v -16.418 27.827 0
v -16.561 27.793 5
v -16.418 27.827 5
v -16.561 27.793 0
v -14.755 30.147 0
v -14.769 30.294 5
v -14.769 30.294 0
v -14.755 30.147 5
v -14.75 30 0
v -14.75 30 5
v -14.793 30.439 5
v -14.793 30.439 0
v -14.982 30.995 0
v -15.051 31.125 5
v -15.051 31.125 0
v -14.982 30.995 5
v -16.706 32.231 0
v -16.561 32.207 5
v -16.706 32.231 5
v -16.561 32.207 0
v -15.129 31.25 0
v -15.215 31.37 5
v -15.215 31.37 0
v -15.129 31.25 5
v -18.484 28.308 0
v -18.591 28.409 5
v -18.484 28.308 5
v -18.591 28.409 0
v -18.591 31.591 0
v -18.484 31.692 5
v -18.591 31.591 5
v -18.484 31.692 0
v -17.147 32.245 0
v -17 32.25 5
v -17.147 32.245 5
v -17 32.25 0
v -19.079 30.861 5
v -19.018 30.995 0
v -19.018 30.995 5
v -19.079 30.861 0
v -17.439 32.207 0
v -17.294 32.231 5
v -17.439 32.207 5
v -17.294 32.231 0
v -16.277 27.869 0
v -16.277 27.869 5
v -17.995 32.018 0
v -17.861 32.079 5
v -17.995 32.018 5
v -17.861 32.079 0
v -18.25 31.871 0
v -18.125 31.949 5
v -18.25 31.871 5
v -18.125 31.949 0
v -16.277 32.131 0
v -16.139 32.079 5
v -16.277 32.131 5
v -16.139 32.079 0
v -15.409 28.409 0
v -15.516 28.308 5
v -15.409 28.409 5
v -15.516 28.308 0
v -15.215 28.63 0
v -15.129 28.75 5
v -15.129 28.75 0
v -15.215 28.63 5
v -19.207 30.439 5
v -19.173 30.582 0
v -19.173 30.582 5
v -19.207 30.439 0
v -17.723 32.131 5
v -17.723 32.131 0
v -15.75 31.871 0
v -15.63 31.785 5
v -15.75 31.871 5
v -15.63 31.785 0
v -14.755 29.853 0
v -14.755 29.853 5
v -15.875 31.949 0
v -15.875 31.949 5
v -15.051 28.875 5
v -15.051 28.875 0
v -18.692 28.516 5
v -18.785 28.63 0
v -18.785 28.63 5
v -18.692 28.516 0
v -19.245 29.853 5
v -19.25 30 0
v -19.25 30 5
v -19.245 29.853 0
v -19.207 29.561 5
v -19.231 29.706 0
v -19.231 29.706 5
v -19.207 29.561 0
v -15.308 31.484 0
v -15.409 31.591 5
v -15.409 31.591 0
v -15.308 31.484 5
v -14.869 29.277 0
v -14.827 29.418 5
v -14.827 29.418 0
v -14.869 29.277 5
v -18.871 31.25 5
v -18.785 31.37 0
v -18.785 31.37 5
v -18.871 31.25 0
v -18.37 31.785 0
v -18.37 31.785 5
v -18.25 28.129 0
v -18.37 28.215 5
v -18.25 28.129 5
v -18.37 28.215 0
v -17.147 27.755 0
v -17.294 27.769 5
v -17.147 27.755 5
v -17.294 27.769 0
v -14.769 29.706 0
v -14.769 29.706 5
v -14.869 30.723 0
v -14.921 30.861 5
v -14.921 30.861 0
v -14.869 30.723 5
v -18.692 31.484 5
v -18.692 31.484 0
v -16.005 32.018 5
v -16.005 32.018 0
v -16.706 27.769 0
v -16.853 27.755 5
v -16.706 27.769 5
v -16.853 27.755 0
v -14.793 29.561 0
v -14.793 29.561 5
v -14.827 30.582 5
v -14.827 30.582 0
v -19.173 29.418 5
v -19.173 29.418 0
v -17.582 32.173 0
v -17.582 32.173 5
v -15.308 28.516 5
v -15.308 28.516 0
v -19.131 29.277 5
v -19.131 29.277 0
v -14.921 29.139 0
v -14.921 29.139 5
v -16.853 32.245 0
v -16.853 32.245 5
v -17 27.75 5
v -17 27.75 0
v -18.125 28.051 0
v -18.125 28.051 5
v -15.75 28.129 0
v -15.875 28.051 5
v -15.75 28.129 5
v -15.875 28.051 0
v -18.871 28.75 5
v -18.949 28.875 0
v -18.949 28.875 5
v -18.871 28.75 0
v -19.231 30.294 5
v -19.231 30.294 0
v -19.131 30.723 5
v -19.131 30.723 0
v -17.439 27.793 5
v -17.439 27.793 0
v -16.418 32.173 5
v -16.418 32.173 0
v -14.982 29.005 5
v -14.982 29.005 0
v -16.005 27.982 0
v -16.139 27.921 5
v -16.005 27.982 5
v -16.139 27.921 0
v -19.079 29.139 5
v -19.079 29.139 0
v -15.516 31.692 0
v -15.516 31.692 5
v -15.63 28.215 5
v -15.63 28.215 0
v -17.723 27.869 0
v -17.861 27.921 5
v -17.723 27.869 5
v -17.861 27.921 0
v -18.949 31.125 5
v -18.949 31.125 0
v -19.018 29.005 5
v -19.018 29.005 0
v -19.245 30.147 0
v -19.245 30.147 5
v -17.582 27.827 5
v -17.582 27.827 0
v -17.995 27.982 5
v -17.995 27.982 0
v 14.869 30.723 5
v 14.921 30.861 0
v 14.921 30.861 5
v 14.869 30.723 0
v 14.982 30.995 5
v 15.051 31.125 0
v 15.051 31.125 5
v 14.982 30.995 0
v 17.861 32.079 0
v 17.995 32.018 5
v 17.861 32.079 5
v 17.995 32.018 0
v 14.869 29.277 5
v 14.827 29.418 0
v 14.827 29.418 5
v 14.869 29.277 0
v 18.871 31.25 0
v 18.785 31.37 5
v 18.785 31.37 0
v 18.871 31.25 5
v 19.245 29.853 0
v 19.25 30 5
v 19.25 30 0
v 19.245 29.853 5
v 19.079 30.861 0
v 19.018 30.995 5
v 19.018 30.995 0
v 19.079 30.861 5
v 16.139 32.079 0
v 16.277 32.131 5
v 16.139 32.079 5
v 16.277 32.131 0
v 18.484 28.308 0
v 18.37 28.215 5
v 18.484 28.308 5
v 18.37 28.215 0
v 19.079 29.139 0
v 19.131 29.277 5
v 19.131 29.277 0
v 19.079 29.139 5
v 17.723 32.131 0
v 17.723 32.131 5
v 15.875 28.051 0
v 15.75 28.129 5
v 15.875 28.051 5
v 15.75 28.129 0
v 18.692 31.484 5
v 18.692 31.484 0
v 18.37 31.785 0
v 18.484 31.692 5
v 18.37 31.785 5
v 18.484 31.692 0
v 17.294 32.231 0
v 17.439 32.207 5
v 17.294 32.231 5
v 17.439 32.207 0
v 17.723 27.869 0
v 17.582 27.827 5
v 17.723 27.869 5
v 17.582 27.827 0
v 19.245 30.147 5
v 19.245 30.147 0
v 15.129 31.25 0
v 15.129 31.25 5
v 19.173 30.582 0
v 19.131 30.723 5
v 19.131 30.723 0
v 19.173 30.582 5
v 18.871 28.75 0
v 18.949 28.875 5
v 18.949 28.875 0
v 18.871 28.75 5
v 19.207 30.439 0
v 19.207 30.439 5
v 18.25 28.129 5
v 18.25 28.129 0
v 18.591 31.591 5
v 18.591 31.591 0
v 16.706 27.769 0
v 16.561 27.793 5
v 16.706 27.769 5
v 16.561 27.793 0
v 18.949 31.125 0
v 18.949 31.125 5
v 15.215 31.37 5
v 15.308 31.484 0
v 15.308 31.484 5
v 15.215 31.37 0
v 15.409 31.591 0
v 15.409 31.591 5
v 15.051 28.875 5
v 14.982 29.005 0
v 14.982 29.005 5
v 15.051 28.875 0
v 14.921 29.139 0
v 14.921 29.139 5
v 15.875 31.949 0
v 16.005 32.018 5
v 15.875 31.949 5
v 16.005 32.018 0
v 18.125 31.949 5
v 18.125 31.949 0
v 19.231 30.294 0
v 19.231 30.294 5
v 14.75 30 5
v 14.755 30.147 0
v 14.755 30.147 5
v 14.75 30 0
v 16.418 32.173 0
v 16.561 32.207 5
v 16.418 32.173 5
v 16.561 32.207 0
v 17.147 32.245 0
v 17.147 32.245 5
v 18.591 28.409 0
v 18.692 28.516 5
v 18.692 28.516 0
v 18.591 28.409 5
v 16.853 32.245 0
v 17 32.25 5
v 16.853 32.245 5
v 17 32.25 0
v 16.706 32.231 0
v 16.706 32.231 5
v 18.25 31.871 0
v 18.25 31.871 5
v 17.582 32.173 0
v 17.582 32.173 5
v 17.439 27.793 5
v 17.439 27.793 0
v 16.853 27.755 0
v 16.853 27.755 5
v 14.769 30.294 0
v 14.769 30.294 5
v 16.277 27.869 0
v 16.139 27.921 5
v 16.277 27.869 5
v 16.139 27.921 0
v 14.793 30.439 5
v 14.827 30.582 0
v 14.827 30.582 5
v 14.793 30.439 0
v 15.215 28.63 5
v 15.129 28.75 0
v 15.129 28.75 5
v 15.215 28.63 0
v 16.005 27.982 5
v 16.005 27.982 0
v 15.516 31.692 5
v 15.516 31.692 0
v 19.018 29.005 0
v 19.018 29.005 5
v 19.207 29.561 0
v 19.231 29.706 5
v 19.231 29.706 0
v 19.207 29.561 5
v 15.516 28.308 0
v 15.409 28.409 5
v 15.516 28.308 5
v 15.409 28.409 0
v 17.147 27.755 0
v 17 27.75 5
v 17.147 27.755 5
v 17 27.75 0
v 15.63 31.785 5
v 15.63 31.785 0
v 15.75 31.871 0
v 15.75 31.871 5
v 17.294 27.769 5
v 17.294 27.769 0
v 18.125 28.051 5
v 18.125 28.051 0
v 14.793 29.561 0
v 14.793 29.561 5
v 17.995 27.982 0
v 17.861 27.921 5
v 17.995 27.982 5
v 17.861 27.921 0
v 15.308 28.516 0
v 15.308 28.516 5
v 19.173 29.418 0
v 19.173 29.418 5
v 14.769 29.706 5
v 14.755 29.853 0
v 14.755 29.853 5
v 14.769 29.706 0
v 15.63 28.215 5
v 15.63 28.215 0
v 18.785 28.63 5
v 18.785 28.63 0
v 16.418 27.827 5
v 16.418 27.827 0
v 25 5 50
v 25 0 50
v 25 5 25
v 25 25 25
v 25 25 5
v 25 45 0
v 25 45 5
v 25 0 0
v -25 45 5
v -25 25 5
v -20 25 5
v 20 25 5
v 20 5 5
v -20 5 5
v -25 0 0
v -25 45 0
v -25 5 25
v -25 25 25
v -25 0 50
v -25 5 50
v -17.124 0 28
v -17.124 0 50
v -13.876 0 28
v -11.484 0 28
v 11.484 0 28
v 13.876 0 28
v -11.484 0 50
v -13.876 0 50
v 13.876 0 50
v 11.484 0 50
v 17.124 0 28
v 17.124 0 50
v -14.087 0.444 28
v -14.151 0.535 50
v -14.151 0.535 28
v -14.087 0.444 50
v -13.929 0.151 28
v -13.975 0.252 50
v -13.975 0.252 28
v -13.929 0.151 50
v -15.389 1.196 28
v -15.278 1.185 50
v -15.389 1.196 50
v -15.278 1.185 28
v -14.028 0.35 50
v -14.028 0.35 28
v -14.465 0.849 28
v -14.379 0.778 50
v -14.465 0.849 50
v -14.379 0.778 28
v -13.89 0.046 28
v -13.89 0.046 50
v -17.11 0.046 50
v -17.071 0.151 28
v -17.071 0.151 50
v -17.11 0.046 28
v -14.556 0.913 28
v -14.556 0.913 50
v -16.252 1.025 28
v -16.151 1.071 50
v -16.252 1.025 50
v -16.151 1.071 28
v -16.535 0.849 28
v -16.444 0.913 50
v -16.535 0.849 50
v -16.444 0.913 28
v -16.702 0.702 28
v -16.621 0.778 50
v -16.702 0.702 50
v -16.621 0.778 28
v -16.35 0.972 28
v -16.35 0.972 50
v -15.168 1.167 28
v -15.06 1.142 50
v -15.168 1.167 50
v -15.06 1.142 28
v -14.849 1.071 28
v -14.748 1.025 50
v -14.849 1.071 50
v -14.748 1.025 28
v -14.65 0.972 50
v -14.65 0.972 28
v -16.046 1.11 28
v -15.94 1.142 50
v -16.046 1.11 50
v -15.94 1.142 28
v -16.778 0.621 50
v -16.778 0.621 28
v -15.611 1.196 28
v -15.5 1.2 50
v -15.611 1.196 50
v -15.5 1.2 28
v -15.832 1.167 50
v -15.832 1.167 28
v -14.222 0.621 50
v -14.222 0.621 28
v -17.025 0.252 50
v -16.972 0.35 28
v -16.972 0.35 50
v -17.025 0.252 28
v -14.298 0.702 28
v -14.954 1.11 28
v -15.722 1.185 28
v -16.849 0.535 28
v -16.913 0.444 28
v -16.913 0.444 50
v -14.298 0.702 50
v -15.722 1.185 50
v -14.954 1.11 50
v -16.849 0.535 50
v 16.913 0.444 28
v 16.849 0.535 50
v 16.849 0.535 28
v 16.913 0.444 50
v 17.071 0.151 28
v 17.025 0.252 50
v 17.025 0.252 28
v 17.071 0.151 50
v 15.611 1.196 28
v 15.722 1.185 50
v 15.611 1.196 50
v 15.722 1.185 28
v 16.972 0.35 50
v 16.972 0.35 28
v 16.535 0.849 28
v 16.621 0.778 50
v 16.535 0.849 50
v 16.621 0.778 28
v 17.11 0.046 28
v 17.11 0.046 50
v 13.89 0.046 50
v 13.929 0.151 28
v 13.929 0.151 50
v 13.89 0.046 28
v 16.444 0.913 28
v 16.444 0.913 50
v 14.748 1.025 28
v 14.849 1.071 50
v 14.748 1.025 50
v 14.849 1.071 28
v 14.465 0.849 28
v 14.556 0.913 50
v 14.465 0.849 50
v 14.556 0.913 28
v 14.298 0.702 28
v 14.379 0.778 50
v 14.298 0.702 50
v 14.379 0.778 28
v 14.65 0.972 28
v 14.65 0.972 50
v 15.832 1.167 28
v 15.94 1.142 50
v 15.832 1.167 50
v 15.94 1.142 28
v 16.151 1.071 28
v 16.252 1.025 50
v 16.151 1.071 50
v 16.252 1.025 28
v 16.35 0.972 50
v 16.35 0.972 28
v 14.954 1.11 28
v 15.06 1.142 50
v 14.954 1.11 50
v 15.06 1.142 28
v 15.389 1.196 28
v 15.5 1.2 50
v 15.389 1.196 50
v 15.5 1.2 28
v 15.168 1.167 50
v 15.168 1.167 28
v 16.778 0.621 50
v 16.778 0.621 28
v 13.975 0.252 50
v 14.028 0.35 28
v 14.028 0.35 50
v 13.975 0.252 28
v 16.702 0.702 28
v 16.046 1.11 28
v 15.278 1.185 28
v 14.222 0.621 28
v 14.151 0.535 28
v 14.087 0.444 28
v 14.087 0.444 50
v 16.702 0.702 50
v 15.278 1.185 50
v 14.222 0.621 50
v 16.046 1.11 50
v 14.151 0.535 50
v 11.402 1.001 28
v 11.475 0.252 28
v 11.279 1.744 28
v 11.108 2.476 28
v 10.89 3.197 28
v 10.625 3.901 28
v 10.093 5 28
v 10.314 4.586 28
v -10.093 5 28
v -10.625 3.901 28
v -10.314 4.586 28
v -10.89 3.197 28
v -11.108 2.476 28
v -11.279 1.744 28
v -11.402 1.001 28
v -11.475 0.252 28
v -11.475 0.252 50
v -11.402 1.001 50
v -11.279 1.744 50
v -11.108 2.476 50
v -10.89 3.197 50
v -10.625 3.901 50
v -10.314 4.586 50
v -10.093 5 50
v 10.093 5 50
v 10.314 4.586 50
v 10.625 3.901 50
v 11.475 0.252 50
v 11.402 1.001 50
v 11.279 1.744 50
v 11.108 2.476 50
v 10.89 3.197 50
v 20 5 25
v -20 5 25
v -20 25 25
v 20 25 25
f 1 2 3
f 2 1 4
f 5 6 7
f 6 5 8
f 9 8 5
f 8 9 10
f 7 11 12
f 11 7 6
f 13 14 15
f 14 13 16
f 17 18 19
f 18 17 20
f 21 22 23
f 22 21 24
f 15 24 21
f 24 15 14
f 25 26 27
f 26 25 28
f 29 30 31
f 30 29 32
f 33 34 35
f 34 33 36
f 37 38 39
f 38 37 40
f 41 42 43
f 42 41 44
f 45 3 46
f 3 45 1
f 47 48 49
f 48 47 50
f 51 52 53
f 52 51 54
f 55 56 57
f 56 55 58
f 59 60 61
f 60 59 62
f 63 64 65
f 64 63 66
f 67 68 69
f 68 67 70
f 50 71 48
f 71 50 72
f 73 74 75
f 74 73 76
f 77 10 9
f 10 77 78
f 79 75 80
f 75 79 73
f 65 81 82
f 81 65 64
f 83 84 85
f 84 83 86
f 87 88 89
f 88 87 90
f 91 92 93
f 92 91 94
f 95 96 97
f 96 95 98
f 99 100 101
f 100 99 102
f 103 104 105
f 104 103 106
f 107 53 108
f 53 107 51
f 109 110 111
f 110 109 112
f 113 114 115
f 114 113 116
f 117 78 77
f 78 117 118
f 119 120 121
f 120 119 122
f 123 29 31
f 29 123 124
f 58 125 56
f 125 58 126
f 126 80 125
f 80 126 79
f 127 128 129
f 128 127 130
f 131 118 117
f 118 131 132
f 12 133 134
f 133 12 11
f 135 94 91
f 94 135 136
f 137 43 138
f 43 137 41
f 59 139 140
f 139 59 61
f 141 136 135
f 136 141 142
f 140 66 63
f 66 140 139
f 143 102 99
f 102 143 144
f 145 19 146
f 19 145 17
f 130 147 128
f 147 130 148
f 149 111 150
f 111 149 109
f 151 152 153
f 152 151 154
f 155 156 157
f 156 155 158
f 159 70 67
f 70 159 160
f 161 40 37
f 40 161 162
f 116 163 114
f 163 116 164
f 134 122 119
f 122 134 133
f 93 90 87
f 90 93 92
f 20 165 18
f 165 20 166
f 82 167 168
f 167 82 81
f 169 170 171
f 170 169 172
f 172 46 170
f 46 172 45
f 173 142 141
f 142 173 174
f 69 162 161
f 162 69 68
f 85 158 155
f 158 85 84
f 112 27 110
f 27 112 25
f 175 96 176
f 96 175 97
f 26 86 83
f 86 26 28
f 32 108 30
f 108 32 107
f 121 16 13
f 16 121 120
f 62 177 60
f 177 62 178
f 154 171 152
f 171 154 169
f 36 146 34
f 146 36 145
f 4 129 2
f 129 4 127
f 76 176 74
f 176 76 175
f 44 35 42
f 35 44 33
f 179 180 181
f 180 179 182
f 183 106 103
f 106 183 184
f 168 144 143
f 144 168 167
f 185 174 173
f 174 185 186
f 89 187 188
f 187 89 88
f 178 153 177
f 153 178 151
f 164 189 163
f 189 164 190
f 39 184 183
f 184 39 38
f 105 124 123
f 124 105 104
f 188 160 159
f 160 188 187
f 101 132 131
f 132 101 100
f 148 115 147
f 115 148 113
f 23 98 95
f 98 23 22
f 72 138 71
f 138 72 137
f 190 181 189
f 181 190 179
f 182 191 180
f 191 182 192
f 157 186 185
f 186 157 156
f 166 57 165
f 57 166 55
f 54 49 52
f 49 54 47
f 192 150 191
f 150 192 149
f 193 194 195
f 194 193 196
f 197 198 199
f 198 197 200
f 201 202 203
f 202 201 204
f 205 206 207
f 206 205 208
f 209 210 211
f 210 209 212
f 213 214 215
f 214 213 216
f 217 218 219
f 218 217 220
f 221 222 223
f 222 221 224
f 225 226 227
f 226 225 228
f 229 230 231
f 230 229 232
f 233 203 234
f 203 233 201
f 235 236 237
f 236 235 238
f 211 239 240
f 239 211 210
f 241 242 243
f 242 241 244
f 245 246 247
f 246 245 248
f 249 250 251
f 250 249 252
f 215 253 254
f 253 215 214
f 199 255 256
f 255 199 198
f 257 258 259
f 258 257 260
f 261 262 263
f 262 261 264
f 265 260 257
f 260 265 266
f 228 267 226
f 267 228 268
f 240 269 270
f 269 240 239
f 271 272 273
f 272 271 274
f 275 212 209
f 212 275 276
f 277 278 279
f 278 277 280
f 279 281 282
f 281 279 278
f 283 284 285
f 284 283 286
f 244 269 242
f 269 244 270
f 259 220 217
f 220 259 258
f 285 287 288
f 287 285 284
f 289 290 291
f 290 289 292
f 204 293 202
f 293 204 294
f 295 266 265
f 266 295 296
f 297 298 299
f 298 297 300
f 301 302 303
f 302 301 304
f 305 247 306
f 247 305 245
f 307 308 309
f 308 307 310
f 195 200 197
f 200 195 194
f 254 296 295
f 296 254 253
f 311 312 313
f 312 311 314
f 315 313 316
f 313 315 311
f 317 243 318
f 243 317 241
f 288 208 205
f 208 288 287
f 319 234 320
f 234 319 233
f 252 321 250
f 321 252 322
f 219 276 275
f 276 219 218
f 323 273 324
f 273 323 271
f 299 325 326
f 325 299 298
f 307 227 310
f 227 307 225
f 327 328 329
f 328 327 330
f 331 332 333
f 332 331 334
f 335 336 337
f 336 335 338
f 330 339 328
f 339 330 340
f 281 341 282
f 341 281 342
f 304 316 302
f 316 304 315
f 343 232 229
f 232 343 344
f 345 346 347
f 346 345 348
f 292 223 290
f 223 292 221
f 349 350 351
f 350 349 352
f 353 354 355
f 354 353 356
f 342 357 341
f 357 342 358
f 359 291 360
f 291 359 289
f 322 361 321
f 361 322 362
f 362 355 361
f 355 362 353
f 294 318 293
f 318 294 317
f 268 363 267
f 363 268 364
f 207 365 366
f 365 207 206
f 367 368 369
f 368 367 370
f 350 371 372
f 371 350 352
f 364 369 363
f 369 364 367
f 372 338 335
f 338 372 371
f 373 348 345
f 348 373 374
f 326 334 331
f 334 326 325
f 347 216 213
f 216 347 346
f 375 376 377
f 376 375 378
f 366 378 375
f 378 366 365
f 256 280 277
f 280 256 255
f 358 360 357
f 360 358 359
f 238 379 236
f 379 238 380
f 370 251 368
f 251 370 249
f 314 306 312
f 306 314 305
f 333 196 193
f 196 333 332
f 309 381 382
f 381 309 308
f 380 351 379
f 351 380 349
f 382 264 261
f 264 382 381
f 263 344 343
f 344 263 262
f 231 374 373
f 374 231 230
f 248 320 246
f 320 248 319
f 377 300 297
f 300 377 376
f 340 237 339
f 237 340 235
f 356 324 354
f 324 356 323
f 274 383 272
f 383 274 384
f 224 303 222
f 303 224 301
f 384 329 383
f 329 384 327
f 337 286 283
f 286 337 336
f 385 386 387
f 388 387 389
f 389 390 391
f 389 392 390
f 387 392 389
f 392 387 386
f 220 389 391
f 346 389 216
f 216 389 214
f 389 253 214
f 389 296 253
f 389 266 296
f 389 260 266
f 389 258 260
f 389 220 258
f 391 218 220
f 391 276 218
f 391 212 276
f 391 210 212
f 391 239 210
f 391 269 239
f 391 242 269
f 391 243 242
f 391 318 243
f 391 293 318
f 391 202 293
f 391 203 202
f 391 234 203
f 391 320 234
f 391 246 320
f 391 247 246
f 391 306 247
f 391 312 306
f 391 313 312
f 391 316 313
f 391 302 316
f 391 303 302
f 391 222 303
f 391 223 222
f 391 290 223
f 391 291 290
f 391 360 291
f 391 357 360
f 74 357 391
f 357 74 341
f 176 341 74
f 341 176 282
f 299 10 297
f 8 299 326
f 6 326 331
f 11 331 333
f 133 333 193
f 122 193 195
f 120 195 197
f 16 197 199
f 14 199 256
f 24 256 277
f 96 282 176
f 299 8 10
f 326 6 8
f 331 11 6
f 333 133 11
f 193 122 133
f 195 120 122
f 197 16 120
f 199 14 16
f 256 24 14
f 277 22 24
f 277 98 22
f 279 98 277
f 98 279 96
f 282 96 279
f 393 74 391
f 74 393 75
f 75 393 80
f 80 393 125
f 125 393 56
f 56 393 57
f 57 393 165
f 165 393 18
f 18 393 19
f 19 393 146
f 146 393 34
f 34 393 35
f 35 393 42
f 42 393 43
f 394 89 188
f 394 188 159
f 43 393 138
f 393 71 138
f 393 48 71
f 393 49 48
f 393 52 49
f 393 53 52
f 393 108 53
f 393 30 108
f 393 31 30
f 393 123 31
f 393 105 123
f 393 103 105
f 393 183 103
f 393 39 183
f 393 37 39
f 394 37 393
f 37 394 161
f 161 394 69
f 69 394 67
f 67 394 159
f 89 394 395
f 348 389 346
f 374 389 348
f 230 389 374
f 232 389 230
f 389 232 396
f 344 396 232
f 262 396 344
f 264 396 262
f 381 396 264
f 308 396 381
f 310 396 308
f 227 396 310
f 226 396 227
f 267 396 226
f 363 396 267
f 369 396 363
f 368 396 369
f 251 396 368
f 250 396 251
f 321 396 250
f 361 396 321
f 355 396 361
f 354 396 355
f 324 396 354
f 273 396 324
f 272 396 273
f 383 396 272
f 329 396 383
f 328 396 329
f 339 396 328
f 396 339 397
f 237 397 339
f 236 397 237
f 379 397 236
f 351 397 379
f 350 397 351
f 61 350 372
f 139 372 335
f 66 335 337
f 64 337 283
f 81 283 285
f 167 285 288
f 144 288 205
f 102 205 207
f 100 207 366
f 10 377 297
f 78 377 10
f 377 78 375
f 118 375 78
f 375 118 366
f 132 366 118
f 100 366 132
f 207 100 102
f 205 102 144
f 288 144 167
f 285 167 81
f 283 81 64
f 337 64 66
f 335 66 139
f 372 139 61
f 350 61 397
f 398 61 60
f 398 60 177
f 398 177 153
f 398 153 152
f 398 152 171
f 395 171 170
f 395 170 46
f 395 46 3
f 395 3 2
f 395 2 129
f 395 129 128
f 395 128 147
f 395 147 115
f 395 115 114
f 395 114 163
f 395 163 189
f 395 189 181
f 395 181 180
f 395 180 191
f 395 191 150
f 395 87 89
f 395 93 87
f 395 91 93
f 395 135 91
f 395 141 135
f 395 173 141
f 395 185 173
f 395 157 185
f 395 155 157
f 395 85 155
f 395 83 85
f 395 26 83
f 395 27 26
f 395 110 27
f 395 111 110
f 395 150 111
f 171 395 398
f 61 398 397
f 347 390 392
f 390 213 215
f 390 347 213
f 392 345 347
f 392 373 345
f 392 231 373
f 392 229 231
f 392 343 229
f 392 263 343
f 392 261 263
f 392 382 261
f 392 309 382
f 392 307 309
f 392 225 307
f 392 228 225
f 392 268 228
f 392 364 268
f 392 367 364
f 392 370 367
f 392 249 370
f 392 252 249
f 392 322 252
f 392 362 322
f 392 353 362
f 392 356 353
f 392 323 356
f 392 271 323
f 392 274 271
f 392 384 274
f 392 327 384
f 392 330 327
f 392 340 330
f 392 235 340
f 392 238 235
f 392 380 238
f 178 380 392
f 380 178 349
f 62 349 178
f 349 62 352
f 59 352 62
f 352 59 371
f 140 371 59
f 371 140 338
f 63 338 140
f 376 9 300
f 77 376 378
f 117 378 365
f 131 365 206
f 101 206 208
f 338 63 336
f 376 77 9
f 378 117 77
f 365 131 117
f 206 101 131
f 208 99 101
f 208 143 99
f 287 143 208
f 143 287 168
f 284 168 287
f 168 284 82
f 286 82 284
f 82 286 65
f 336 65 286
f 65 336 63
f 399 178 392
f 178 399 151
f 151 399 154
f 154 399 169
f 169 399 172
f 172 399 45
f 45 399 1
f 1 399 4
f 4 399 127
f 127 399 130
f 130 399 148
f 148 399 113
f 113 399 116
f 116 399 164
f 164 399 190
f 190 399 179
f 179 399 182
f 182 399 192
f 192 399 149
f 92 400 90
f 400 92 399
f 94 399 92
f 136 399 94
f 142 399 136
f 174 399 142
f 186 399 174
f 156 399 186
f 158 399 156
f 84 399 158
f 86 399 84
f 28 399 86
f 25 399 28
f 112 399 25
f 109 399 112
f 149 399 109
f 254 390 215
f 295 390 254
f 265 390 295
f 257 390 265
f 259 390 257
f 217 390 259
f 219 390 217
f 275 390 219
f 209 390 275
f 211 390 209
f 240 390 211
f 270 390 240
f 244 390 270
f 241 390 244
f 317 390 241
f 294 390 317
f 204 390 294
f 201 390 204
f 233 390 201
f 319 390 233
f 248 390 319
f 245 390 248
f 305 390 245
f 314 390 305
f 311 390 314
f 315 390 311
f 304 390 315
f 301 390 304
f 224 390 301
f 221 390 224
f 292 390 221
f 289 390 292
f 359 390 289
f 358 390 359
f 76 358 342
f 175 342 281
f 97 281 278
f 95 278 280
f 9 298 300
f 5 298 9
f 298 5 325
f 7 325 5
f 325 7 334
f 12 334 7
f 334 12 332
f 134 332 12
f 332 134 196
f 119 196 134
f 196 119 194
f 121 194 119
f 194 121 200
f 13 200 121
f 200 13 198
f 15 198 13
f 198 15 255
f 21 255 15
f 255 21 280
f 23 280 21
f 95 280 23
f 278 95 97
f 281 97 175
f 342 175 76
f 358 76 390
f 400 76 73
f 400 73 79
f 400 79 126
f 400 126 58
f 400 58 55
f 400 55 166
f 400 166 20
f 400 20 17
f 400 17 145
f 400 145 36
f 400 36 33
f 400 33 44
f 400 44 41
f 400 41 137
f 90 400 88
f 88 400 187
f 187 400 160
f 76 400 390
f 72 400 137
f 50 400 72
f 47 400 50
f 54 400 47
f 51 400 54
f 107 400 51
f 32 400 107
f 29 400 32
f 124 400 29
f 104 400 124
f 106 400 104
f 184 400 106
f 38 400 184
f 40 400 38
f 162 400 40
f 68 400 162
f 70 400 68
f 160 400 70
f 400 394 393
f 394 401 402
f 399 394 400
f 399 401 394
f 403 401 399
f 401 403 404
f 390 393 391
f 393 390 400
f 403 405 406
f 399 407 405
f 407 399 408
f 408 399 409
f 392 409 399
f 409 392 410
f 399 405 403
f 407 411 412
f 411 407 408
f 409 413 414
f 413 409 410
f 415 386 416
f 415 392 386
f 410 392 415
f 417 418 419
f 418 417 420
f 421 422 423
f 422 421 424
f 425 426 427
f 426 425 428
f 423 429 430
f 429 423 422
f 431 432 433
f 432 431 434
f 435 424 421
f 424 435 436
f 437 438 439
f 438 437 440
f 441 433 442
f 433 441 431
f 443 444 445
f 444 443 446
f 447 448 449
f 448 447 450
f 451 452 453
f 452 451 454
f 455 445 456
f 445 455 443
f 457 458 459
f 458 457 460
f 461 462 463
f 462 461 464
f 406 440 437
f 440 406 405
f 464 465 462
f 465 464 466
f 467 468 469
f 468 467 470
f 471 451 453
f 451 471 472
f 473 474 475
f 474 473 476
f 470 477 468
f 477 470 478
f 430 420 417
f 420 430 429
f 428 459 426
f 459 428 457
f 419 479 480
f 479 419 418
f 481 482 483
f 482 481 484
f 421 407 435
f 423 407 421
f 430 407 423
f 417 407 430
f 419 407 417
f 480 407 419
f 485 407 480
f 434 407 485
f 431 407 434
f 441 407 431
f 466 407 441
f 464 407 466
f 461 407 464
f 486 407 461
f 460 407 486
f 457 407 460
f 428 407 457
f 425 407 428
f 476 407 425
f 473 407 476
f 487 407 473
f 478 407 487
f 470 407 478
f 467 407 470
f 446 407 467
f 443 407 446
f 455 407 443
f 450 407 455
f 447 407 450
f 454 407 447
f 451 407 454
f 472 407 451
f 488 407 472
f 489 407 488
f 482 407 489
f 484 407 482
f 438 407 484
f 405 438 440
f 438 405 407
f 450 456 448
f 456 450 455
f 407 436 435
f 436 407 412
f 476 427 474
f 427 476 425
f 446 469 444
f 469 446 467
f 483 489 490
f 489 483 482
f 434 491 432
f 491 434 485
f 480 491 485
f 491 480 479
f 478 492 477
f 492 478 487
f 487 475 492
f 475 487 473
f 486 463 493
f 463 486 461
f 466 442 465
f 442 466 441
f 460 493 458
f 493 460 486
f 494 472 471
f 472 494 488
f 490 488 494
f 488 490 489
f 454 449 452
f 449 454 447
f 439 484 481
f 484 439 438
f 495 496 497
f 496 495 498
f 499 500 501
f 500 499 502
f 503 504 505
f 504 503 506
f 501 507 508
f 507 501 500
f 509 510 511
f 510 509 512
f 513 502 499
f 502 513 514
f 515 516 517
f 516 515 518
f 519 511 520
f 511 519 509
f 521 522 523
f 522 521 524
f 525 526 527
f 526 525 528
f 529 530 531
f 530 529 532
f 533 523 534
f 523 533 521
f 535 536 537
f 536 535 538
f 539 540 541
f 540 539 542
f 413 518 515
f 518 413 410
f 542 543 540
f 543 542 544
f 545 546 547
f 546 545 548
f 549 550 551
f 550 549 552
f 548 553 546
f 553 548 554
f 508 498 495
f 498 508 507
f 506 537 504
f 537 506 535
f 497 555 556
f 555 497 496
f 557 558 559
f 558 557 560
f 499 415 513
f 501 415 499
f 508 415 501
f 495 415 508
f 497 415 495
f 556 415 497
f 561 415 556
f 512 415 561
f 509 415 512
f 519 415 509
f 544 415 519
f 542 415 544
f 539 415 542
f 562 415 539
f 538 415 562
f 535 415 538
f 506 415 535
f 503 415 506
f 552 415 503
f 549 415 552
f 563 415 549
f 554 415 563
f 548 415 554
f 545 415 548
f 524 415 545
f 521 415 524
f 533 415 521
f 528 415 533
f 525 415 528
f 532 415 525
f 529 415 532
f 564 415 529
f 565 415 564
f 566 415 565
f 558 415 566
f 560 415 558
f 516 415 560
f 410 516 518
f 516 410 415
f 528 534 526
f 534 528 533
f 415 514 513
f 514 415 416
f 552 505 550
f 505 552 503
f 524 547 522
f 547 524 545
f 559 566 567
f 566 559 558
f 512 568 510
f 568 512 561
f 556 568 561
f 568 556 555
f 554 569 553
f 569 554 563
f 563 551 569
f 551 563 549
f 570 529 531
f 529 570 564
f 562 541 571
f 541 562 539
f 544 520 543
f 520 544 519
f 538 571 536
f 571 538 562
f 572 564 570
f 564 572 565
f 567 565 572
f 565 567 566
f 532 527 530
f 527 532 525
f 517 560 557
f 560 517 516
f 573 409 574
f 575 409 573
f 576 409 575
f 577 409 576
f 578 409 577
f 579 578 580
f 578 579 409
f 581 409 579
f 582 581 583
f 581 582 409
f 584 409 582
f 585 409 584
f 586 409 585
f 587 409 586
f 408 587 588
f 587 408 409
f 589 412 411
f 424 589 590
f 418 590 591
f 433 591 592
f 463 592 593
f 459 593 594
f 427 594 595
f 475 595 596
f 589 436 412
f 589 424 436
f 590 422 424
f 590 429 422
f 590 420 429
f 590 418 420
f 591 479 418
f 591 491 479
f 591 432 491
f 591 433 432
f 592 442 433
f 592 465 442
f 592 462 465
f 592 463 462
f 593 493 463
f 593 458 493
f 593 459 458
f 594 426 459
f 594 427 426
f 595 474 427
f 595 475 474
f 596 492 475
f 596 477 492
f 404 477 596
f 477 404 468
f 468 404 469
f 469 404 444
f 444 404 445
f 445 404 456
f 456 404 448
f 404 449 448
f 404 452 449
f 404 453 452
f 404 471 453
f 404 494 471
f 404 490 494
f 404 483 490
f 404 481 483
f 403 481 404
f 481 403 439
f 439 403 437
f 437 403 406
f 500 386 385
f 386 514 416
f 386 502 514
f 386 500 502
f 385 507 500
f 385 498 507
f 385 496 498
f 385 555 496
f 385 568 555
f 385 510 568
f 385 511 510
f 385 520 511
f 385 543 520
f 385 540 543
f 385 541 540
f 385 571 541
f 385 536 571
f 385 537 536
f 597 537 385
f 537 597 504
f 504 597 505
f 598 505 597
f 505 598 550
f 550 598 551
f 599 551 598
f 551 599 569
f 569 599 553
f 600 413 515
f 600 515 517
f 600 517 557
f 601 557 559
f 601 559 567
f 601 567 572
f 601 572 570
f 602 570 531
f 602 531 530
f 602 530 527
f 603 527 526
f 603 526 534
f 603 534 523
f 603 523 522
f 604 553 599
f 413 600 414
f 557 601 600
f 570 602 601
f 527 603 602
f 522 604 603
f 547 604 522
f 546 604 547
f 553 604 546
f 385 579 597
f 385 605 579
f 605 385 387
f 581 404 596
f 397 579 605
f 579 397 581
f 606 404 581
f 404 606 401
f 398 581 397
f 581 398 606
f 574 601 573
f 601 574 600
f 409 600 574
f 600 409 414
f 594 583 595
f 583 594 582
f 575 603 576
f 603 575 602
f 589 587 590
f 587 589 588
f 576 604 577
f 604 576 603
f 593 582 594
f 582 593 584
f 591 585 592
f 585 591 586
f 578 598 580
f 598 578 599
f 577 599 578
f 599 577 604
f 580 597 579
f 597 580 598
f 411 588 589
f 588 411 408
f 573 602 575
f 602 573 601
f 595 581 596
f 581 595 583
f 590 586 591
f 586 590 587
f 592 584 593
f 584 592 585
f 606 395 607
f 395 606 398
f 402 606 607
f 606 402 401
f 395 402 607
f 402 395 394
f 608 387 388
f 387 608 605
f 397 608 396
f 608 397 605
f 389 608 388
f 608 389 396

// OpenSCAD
// L-shaped mounting bracket for NEMA 17 stepper motor (e.g. syringe pump)
// Print orientation: base plate on the bed, motor plate building up in +Z

// ---------------- Parameters ----------------
plate_t      = 5;     // base plate thickness (Z)
base_x       = 25;    // base plate extends from -25 to +25 in X
base_y       = 45;    // base plate extends from 0 to 45 in Y
base_h       = 5;     // base plate height (same as plate_t)

hole_m4_x    = 17;    // M4 through-holes in base plate at x = -17 and +17
hole_m4_y    = 30;    // M4 through-holes in base plate at y = 30
hole_m4_d    = 4.5;   // M4 hole diameter

plate_z      = 50;    // motor plate height (Z)
plate_y      = 5;     // motor plate extends from 0 to 5 in Y
motor_boss_d = 23;    // motor centring boss hole diameter
motor_boss_x = 0;     // motor boss hole centre X
motor_boss_z = 28;    // motor boss hole centre Z

screw_d      = 3.4;   // M3 screw holes
screw_n      = 4;     // number of screw holes
screw_pitch  = 31;    // square pattern side length
screw_x      = 0;     // screw pattern centre X
screw_z      = 28;    // screw pattern centre Z

gusset_t     = 5;     // gusset thickness (X)
gusset_y     = 20;    // gusset leg along +Y
gusset_z     = 20;    // gusset leg along +Z
gusset_x0    = -25;   // left gusset start X
gusset_x1    = 25;    // right gusset start X

eps          = 0.5;   // cutter overshoot past faces
$fn          = 96;    // curve resolution

// ---------------- Model ----------------
union() {
    // Base plate with M4 through-holes
    difference() {
        translate([-base_x, 0, 0])
            cube([2 * base_x, base_y, base_h]);
        for (sx = [-1, 1])
            translate([sx * hole_m4_x, hole_m4_y, -eps])
                cylinder(d = hole_m4_d, h = base_h + 2 * eps);
    }

    // Vertical motor plate with boss hole and M3 screw holes
    difference() {
        translate([-base_x, 0, 0])
            cube([2 * base_x, plate_y, plate_z]);
        translate([motor_boss_x, -eps, motor_boss_z])
            cylinder(d = motor_boss_d, h = plate_z + 2 * eps);
        for (i = [0 : screw_n - 1]) {
            a = (i - screw_n / 2) * screw_pitch;
            translate([screw_x + a / 2, -eps, screw_z])
                cylinder(d = screw_d, h = plate_z + 2 * eps);
            translate([screw_x - a / 2, -eps, screw_z])
                cylinder(d = screw_d, h = plate_z + 2 * eps);
        }
    }

    // Left triangular gusset (right-angle corner at y = 5, z = 5)
    translate([gusset_x0, 5, 5])
        cube([gusset_t, gusset_y, gusset_z]);

    // Right triangular gusset (right-angle corner at y = 5, z = 5)
    translate([gusset_x1 - gusset_t, 5, 5])
        cube([gusset_t, gusset_y, gusset_z]);
}
